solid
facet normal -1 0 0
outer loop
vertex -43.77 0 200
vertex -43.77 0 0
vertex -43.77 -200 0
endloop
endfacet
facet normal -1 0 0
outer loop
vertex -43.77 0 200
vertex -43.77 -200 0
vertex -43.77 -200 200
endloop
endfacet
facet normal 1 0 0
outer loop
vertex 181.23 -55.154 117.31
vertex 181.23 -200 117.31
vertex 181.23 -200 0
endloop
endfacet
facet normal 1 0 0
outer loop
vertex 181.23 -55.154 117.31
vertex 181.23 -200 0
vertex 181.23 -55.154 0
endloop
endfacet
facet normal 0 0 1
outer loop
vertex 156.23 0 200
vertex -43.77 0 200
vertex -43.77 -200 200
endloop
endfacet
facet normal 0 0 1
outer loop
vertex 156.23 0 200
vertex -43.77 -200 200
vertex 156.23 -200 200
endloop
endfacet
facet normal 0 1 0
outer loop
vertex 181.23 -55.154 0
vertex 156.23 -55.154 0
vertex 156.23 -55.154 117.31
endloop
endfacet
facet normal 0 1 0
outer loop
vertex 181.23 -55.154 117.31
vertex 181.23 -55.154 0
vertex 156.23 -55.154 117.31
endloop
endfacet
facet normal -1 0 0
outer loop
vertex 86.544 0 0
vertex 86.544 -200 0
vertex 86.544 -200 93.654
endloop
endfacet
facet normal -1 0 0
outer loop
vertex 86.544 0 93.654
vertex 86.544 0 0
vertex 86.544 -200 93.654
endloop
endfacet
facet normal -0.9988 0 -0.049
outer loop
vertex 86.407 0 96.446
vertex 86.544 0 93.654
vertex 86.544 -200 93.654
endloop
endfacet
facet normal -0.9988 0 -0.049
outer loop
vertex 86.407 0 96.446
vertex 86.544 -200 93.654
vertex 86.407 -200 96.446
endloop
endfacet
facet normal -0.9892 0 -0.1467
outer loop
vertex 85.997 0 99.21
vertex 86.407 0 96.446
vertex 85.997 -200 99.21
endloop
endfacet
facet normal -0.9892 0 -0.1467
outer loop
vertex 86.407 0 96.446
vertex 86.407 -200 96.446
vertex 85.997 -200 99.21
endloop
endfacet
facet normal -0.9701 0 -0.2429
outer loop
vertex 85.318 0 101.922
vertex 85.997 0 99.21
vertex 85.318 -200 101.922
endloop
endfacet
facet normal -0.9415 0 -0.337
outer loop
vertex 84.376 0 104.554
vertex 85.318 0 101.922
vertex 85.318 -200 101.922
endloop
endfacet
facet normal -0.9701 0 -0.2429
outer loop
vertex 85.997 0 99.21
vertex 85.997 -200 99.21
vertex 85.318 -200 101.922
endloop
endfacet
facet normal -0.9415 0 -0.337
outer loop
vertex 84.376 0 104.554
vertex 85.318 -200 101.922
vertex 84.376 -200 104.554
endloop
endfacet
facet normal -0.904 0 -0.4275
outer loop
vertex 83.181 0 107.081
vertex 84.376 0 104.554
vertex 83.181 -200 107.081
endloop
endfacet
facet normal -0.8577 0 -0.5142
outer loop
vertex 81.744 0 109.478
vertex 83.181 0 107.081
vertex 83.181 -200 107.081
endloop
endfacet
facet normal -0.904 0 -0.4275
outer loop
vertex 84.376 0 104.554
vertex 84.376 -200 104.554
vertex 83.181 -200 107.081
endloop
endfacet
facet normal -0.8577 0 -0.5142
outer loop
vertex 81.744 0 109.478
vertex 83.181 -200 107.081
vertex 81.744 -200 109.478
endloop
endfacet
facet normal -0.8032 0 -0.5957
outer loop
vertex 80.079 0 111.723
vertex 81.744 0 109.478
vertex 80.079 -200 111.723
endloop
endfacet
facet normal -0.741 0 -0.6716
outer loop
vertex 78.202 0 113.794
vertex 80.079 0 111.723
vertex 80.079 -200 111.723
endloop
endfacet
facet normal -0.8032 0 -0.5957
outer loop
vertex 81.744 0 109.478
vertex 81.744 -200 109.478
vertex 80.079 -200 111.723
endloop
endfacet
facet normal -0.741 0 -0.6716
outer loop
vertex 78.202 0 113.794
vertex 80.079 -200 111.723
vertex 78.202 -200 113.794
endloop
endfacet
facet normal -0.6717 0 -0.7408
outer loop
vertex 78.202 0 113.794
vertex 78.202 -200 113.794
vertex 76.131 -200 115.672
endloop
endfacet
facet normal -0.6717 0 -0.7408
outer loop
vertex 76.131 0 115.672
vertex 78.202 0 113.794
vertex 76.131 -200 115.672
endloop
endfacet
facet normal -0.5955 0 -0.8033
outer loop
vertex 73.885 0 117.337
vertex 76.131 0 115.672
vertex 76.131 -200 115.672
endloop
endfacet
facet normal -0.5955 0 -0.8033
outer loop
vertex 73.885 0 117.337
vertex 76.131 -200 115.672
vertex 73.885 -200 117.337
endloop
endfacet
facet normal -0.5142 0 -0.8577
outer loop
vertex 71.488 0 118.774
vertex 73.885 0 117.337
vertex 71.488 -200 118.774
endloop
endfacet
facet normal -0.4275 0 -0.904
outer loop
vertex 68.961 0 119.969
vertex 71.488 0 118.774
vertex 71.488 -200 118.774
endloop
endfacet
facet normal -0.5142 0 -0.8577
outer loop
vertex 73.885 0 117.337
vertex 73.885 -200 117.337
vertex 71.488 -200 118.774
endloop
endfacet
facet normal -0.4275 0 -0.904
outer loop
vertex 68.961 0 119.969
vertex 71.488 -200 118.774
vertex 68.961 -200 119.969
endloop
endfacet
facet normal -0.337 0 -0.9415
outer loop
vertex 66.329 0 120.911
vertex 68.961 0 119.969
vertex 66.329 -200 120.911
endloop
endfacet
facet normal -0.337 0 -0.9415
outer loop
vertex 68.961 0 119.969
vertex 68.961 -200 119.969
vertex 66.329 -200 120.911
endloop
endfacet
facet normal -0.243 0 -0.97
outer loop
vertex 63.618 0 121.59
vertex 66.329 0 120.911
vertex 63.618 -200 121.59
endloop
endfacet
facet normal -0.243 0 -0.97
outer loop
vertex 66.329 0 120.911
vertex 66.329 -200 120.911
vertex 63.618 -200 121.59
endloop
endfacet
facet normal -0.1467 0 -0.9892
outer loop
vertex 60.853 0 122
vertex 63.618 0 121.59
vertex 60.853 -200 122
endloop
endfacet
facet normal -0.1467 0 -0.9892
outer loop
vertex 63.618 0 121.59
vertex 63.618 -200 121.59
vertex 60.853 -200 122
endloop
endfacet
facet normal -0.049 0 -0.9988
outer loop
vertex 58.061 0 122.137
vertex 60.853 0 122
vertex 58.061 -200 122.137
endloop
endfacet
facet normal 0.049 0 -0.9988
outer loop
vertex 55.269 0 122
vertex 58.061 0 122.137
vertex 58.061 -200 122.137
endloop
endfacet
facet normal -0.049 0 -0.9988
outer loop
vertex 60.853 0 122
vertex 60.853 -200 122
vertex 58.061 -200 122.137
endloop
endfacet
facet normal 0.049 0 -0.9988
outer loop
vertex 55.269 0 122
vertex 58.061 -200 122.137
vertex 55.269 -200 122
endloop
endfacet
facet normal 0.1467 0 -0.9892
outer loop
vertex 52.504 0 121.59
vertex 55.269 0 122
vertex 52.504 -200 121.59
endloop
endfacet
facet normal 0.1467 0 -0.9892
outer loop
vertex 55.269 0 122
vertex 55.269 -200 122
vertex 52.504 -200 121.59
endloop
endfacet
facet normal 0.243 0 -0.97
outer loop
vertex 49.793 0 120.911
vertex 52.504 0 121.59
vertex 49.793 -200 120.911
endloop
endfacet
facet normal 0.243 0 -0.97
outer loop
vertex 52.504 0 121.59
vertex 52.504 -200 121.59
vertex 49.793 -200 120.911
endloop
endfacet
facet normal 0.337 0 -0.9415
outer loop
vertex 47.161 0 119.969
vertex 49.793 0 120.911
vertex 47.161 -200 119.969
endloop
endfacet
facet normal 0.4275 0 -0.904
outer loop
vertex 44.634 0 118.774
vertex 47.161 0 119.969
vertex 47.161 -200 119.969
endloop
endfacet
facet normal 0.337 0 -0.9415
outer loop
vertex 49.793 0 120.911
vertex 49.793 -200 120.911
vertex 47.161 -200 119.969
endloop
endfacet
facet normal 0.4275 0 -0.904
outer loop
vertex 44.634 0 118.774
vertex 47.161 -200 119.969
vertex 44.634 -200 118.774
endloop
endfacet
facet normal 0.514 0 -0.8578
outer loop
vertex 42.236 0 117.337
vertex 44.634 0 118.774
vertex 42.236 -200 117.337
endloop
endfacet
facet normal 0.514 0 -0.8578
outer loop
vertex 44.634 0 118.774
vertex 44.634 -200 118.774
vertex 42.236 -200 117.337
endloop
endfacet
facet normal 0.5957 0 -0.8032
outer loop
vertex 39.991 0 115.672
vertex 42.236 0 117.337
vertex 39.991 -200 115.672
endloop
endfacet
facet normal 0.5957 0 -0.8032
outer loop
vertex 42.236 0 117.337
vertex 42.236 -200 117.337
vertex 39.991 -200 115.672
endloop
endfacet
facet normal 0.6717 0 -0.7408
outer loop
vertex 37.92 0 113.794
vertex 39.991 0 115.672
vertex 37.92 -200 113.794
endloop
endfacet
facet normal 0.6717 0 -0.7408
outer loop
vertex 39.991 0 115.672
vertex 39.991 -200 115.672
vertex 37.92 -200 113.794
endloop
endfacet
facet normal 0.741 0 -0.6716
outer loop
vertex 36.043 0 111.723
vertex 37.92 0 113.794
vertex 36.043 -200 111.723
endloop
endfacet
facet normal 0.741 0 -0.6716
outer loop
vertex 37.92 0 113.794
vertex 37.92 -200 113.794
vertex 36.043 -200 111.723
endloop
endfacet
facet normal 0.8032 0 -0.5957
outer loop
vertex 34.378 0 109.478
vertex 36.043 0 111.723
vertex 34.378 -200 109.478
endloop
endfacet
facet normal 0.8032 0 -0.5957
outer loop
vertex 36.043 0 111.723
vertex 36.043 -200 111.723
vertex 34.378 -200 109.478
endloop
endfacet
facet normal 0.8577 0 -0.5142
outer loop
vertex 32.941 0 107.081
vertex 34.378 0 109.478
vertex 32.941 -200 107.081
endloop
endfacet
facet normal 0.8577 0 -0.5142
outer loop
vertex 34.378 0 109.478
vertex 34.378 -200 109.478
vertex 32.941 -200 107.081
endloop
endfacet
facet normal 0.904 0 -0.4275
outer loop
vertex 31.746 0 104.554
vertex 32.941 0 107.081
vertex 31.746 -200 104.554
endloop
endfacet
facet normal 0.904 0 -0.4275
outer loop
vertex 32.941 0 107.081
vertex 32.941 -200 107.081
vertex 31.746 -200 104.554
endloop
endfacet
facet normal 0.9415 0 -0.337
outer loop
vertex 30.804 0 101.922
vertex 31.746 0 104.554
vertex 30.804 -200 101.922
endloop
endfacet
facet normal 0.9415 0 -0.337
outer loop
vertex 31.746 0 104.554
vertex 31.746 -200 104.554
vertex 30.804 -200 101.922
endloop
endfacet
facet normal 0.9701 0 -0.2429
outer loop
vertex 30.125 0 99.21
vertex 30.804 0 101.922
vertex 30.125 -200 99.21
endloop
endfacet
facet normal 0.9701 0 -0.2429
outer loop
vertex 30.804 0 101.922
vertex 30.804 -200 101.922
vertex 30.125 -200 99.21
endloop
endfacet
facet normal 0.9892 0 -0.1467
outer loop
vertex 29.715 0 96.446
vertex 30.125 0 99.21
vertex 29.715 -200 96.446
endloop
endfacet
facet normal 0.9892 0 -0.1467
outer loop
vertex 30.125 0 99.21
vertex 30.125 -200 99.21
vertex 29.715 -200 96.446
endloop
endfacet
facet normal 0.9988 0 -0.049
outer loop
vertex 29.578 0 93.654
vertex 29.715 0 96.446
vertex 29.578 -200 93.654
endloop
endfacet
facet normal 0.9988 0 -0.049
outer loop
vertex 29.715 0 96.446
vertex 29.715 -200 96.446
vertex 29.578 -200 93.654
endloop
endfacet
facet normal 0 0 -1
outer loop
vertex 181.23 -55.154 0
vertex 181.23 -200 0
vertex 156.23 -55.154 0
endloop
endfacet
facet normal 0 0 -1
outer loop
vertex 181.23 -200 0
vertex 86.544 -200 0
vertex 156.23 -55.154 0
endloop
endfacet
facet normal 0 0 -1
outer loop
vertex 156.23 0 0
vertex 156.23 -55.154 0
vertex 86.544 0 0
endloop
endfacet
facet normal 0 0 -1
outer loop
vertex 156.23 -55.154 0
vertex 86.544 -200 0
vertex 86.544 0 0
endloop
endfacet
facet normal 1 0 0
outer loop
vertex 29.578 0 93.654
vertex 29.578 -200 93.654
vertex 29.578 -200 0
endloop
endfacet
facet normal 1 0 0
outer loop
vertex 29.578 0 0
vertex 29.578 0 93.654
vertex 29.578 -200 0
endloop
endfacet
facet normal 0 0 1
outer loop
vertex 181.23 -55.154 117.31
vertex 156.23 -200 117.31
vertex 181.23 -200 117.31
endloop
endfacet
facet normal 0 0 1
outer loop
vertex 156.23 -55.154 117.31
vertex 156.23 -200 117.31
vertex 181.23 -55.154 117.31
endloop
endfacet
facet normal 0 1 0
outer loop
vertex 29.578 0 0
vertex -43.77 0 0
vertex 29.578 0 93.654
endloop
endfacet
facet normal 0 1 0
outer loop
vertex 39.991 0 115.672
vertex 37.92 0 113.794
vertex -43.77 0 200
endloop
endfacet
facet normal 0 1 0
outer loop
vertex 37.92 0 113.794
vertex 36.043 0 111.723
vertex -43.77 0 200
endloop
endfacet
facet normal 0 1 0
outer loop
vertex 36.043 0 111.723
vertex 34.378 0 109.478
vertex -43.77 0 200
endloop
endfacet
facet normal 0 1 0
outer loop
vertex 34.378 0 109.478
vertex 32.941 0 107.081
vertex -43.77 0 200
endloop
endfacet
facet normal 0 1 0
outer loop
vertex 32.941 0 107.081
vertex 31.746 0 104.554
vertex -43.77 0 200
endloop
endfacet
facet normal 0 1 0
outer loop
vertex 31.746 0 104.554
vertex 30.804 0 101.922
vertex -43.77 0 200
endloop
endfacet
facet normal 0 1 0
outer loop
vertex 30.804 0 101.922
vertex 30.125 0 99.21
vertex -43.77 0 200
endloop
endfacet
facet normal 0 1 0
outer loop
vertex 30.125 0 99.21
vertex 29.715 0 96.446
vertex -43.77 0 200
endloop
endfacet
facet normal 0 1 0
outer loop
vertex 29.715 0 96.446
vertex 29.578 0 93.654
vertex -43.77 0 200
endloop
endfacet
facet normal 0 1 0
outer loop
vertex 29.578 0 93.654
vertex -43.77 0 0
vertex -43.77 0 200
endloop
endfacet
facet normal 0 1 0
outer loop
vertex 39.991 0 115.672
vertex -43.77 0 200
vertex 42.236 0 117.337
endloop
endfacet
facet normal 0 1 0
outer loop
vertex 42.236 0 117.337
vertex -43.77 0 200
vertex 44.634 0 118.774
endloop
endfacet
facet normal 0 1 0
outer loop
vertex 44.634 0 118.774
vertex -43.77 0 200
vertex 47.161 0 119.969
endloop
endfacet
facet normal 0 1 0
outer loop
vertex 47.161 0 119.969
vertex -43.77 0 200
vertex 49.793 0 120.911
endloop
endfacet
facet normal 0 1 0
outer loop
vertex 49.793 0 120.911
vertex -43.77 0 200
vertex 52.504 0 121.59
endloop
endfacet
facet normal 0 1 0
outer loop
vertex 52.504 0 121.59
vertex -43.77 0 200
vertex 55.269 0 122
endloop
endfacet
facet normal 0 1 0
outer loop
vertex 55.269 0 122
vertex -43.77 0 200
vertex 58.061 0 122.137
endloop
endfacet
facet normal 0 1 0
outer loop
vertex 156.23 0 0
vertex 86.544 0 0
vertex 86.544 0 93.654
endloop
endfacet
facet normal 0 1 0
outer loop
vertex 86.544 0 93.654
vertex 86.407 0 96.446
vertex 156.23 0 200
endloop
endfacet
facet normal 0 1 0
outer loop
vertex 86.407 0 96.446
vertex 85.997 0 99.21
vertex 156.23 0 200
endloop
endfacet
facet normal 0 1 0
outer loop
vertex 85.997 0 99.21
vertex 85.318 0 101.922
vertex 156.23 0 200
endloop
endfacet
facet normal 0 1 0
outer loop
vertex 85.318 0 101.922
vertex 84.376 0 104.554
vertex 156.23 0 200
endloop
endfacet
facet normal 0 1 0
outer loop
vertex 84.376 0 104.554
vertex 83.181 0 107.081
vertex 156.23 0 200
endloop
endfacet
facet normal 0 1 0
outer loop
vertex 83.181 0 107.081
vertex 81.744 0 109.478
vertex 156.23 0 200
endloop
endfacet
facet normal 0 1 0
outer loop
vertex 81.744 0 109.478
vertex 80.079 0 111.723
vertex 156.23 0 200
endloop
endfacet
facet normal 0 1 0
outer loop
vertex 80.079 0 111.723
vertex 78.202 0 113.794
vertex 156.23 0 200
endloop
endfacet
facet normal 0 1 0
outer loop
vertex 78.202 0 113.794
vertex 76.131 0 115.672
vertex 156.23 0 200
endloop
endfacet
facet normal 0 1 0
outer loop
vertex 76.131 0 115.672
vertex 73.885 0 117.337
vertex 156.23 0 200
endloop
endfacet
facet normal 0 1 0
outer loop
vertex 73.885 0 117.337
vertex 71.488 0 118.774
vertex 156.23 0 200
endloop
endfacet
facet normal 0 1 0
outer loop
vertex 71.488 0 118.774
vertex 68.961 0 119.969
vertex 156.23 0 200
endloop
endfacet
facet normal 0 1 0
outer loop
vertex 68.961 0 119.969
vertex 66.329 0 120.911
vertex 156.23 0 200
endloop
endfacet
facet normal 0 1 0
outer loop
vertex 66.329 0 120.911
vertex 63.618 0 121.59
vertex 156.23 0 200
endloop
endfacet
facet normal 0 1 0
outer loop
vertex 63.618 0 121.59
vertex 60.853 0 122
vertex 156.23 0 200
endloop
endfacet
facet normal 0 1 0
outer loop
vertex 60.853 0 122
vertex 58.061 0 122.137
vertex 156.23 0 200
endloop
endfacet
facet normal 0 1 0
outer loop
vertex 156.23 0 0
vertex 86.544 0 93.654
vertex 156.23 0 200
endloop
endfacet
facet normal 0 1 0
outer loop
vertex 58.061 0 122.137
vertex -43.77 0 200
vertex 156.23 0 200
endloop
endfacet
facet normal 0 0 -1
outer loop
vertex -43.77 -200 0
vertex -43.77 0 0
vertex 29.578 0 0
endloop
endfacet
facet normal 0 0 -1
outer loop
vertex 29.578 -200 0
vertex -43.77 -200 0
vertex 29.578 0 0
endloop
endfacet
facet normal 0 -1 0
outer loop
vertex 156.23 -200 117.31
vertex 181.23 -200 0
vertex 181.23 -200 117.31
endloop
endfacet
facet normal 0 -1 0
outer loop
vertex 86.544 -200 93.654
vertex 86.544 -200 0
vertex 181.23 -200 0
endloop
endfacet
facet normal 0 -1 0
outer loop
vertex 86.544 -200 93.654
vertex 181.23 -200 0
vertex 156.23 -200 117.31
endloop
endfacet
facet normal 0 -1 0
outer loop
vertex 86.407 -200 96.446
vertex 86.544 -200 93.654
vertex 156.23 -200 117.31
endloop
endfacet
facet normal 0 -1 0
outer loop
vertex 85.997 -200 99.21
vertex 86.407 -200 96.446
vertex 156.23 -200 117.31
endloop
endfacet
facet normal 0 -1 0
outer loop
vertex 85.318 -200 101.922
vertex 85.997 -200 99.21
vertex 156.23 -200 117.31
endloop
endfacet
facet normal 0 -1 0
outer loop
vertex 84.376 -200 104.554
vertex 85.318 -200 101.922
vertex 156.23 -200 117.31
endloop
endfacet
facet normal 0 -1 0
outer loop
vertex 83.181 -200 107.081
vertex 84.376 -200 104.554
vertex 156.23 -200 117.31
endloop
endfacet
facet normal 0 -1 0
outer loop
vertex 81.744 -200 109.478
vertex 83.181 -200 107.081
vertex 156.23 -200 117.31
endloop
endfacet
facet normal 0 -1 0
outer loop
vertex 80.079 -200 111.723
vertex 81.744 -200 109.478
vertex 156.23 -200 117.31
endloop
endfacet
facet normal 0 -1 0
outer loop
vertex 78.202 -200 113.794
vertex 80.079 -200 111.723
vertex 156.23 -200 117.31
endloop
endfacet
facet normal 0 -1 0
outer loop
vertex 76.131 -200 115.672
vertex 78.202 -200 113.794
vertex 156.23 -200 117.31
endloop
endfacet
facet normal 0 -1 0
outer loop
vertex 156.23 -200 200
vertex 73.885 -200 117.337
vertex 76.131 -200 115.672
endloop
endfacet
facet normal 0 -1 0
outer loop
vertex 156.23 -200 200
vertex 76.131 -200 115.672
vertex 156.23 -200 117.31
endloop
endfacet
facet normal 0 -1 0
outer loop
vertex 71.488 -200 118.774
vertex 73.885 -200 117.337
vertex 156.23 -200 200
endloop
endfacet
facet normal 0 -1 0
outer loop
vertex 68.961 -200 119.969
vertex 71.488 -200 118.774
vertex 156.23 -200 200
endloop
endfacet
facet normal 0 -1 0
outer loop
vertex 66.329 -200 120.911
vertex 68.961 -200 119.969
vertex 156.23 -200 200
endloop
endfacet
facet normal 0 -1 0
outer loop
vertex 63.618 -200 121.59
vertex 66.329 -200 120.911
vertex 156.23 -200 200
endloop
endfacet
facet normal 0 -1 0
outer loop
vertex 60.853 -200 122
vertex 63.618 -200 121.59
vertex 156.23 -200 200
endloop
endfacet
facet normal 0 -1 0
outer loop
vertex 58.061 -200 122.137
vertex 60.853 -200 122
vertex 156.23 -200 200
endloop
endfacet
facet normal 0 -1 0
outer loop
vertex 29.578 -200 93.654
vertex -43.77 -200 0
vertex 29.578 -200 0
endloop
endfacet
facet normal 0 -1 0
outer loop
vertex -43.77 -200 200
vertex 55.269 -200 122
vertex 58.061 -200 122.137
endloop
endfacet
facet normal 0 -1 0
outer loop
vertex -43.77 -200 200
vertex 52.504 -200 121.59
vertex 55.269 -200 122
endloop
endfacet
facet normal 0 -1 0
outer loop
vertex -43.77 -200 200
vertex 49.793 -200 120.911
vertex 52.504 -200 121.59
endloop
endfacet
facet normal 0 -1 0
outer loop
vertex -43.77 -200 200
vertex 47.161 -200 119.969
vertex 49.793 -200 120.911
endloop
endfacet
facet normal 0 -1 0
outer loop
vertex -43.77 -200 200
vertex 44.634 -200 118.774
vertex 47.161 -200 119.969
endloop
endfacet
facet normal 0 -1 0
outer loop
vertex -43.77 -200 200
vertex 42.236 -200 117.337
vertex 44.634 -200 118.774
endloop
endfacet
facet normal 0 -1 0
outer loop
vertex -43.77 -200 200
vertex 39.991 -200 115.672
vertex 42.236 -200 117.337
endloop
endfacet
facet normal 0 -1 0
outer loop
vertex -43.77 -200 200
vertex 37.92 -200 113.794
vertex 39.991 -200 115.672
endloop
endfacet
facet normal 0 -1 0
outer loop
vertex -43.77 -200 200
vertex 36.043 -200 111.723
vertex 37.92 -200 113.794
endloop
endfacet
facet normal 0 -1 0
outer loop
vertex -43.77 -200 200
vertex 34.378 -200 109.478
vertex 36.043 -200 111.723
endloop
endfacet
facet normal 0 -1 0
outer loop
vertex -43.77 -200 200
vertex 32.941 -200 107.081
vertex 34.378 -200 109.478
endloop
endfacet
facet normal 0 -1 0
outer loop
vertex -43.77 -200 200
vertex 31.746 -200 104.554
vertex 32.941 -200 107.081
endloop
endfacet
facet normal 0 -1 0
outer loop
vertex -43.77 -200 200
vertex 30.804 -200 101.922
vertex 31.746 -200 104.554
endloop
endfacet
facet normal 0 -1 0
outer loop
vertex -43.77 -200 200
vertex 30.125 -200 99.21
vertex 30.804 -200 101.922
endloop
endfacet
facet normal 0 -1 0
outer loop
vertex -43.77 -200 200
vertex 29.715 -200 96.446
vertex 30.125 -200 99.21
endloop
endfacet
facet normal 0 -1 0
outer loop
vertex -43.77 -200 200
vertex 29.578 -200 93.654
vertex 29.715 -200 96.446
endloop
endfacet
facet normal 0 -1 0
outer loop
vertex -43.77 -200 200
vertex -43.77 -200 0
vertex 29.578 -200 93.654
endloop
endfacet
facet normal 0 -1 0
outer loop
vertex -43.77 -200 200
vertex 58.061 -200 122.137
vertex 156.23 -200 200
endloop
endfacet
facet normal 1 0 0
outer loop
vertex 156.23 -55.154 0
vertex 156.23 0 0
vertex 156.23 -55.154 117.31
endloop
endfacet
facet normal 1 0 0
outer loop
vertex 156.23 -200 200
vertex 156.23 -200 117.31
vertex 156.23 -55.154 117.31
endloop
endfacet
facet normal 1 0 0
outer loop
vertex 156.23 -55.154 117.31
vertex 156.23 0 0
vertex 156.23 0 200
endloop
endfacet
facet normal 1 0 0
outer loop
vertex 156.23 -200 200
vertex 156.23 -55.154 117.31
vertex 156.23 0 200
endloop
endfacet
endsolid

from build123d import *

# Parameters (mm, degrees)
F0_W     = 200
F0_H     = 200
F1_DEPTH = 200
F3_DEPTH = 200
F4_W     = 144.8461644351
F4_H     = 117.3098683357
F5_DEPTH = 25


with BuildPart() as f1:
    # F0 (on Front) → F1 (new body)
    with BuildSketch(Plane.XZ):
        with Locations((56.2296494842, 100)):
            Rectangle(F0_W, F0_H)
    extrude(amount=F1_DEPTH)

    # F2 (on face) → F3 (cut, through all)
    with BuildSketch(Plane.XZ.offset(200)):
        with BuildLine():
            Line((29.5775197446, 93.6536714435), (29.5775197446, 0))
            Line((29.5775197446, 0), (86.5442305803, 0))
            Line((86.5442305803, 0), (86.5442305803, 93.6536714435))
            ThreePointArc((86.5442305803, 93.6536714435), (58.0608751625, 122.1370268613), (29.5775197446, 93.6536714435))
        make_face()
    extrude(amount=-F3_DEPTH, mode=Mode.SUBTRACT)

    # F4 (on face) → F5 (join)
    with BuildSketch(Plane.YZ.offset(156.2296494842)):
        with Locations((-127.5769177824, 58.6549341679)):
            Rectangle(F4_W, F4_H)
    extrude(amount=F5_DEPTH)


solid = f1.part
